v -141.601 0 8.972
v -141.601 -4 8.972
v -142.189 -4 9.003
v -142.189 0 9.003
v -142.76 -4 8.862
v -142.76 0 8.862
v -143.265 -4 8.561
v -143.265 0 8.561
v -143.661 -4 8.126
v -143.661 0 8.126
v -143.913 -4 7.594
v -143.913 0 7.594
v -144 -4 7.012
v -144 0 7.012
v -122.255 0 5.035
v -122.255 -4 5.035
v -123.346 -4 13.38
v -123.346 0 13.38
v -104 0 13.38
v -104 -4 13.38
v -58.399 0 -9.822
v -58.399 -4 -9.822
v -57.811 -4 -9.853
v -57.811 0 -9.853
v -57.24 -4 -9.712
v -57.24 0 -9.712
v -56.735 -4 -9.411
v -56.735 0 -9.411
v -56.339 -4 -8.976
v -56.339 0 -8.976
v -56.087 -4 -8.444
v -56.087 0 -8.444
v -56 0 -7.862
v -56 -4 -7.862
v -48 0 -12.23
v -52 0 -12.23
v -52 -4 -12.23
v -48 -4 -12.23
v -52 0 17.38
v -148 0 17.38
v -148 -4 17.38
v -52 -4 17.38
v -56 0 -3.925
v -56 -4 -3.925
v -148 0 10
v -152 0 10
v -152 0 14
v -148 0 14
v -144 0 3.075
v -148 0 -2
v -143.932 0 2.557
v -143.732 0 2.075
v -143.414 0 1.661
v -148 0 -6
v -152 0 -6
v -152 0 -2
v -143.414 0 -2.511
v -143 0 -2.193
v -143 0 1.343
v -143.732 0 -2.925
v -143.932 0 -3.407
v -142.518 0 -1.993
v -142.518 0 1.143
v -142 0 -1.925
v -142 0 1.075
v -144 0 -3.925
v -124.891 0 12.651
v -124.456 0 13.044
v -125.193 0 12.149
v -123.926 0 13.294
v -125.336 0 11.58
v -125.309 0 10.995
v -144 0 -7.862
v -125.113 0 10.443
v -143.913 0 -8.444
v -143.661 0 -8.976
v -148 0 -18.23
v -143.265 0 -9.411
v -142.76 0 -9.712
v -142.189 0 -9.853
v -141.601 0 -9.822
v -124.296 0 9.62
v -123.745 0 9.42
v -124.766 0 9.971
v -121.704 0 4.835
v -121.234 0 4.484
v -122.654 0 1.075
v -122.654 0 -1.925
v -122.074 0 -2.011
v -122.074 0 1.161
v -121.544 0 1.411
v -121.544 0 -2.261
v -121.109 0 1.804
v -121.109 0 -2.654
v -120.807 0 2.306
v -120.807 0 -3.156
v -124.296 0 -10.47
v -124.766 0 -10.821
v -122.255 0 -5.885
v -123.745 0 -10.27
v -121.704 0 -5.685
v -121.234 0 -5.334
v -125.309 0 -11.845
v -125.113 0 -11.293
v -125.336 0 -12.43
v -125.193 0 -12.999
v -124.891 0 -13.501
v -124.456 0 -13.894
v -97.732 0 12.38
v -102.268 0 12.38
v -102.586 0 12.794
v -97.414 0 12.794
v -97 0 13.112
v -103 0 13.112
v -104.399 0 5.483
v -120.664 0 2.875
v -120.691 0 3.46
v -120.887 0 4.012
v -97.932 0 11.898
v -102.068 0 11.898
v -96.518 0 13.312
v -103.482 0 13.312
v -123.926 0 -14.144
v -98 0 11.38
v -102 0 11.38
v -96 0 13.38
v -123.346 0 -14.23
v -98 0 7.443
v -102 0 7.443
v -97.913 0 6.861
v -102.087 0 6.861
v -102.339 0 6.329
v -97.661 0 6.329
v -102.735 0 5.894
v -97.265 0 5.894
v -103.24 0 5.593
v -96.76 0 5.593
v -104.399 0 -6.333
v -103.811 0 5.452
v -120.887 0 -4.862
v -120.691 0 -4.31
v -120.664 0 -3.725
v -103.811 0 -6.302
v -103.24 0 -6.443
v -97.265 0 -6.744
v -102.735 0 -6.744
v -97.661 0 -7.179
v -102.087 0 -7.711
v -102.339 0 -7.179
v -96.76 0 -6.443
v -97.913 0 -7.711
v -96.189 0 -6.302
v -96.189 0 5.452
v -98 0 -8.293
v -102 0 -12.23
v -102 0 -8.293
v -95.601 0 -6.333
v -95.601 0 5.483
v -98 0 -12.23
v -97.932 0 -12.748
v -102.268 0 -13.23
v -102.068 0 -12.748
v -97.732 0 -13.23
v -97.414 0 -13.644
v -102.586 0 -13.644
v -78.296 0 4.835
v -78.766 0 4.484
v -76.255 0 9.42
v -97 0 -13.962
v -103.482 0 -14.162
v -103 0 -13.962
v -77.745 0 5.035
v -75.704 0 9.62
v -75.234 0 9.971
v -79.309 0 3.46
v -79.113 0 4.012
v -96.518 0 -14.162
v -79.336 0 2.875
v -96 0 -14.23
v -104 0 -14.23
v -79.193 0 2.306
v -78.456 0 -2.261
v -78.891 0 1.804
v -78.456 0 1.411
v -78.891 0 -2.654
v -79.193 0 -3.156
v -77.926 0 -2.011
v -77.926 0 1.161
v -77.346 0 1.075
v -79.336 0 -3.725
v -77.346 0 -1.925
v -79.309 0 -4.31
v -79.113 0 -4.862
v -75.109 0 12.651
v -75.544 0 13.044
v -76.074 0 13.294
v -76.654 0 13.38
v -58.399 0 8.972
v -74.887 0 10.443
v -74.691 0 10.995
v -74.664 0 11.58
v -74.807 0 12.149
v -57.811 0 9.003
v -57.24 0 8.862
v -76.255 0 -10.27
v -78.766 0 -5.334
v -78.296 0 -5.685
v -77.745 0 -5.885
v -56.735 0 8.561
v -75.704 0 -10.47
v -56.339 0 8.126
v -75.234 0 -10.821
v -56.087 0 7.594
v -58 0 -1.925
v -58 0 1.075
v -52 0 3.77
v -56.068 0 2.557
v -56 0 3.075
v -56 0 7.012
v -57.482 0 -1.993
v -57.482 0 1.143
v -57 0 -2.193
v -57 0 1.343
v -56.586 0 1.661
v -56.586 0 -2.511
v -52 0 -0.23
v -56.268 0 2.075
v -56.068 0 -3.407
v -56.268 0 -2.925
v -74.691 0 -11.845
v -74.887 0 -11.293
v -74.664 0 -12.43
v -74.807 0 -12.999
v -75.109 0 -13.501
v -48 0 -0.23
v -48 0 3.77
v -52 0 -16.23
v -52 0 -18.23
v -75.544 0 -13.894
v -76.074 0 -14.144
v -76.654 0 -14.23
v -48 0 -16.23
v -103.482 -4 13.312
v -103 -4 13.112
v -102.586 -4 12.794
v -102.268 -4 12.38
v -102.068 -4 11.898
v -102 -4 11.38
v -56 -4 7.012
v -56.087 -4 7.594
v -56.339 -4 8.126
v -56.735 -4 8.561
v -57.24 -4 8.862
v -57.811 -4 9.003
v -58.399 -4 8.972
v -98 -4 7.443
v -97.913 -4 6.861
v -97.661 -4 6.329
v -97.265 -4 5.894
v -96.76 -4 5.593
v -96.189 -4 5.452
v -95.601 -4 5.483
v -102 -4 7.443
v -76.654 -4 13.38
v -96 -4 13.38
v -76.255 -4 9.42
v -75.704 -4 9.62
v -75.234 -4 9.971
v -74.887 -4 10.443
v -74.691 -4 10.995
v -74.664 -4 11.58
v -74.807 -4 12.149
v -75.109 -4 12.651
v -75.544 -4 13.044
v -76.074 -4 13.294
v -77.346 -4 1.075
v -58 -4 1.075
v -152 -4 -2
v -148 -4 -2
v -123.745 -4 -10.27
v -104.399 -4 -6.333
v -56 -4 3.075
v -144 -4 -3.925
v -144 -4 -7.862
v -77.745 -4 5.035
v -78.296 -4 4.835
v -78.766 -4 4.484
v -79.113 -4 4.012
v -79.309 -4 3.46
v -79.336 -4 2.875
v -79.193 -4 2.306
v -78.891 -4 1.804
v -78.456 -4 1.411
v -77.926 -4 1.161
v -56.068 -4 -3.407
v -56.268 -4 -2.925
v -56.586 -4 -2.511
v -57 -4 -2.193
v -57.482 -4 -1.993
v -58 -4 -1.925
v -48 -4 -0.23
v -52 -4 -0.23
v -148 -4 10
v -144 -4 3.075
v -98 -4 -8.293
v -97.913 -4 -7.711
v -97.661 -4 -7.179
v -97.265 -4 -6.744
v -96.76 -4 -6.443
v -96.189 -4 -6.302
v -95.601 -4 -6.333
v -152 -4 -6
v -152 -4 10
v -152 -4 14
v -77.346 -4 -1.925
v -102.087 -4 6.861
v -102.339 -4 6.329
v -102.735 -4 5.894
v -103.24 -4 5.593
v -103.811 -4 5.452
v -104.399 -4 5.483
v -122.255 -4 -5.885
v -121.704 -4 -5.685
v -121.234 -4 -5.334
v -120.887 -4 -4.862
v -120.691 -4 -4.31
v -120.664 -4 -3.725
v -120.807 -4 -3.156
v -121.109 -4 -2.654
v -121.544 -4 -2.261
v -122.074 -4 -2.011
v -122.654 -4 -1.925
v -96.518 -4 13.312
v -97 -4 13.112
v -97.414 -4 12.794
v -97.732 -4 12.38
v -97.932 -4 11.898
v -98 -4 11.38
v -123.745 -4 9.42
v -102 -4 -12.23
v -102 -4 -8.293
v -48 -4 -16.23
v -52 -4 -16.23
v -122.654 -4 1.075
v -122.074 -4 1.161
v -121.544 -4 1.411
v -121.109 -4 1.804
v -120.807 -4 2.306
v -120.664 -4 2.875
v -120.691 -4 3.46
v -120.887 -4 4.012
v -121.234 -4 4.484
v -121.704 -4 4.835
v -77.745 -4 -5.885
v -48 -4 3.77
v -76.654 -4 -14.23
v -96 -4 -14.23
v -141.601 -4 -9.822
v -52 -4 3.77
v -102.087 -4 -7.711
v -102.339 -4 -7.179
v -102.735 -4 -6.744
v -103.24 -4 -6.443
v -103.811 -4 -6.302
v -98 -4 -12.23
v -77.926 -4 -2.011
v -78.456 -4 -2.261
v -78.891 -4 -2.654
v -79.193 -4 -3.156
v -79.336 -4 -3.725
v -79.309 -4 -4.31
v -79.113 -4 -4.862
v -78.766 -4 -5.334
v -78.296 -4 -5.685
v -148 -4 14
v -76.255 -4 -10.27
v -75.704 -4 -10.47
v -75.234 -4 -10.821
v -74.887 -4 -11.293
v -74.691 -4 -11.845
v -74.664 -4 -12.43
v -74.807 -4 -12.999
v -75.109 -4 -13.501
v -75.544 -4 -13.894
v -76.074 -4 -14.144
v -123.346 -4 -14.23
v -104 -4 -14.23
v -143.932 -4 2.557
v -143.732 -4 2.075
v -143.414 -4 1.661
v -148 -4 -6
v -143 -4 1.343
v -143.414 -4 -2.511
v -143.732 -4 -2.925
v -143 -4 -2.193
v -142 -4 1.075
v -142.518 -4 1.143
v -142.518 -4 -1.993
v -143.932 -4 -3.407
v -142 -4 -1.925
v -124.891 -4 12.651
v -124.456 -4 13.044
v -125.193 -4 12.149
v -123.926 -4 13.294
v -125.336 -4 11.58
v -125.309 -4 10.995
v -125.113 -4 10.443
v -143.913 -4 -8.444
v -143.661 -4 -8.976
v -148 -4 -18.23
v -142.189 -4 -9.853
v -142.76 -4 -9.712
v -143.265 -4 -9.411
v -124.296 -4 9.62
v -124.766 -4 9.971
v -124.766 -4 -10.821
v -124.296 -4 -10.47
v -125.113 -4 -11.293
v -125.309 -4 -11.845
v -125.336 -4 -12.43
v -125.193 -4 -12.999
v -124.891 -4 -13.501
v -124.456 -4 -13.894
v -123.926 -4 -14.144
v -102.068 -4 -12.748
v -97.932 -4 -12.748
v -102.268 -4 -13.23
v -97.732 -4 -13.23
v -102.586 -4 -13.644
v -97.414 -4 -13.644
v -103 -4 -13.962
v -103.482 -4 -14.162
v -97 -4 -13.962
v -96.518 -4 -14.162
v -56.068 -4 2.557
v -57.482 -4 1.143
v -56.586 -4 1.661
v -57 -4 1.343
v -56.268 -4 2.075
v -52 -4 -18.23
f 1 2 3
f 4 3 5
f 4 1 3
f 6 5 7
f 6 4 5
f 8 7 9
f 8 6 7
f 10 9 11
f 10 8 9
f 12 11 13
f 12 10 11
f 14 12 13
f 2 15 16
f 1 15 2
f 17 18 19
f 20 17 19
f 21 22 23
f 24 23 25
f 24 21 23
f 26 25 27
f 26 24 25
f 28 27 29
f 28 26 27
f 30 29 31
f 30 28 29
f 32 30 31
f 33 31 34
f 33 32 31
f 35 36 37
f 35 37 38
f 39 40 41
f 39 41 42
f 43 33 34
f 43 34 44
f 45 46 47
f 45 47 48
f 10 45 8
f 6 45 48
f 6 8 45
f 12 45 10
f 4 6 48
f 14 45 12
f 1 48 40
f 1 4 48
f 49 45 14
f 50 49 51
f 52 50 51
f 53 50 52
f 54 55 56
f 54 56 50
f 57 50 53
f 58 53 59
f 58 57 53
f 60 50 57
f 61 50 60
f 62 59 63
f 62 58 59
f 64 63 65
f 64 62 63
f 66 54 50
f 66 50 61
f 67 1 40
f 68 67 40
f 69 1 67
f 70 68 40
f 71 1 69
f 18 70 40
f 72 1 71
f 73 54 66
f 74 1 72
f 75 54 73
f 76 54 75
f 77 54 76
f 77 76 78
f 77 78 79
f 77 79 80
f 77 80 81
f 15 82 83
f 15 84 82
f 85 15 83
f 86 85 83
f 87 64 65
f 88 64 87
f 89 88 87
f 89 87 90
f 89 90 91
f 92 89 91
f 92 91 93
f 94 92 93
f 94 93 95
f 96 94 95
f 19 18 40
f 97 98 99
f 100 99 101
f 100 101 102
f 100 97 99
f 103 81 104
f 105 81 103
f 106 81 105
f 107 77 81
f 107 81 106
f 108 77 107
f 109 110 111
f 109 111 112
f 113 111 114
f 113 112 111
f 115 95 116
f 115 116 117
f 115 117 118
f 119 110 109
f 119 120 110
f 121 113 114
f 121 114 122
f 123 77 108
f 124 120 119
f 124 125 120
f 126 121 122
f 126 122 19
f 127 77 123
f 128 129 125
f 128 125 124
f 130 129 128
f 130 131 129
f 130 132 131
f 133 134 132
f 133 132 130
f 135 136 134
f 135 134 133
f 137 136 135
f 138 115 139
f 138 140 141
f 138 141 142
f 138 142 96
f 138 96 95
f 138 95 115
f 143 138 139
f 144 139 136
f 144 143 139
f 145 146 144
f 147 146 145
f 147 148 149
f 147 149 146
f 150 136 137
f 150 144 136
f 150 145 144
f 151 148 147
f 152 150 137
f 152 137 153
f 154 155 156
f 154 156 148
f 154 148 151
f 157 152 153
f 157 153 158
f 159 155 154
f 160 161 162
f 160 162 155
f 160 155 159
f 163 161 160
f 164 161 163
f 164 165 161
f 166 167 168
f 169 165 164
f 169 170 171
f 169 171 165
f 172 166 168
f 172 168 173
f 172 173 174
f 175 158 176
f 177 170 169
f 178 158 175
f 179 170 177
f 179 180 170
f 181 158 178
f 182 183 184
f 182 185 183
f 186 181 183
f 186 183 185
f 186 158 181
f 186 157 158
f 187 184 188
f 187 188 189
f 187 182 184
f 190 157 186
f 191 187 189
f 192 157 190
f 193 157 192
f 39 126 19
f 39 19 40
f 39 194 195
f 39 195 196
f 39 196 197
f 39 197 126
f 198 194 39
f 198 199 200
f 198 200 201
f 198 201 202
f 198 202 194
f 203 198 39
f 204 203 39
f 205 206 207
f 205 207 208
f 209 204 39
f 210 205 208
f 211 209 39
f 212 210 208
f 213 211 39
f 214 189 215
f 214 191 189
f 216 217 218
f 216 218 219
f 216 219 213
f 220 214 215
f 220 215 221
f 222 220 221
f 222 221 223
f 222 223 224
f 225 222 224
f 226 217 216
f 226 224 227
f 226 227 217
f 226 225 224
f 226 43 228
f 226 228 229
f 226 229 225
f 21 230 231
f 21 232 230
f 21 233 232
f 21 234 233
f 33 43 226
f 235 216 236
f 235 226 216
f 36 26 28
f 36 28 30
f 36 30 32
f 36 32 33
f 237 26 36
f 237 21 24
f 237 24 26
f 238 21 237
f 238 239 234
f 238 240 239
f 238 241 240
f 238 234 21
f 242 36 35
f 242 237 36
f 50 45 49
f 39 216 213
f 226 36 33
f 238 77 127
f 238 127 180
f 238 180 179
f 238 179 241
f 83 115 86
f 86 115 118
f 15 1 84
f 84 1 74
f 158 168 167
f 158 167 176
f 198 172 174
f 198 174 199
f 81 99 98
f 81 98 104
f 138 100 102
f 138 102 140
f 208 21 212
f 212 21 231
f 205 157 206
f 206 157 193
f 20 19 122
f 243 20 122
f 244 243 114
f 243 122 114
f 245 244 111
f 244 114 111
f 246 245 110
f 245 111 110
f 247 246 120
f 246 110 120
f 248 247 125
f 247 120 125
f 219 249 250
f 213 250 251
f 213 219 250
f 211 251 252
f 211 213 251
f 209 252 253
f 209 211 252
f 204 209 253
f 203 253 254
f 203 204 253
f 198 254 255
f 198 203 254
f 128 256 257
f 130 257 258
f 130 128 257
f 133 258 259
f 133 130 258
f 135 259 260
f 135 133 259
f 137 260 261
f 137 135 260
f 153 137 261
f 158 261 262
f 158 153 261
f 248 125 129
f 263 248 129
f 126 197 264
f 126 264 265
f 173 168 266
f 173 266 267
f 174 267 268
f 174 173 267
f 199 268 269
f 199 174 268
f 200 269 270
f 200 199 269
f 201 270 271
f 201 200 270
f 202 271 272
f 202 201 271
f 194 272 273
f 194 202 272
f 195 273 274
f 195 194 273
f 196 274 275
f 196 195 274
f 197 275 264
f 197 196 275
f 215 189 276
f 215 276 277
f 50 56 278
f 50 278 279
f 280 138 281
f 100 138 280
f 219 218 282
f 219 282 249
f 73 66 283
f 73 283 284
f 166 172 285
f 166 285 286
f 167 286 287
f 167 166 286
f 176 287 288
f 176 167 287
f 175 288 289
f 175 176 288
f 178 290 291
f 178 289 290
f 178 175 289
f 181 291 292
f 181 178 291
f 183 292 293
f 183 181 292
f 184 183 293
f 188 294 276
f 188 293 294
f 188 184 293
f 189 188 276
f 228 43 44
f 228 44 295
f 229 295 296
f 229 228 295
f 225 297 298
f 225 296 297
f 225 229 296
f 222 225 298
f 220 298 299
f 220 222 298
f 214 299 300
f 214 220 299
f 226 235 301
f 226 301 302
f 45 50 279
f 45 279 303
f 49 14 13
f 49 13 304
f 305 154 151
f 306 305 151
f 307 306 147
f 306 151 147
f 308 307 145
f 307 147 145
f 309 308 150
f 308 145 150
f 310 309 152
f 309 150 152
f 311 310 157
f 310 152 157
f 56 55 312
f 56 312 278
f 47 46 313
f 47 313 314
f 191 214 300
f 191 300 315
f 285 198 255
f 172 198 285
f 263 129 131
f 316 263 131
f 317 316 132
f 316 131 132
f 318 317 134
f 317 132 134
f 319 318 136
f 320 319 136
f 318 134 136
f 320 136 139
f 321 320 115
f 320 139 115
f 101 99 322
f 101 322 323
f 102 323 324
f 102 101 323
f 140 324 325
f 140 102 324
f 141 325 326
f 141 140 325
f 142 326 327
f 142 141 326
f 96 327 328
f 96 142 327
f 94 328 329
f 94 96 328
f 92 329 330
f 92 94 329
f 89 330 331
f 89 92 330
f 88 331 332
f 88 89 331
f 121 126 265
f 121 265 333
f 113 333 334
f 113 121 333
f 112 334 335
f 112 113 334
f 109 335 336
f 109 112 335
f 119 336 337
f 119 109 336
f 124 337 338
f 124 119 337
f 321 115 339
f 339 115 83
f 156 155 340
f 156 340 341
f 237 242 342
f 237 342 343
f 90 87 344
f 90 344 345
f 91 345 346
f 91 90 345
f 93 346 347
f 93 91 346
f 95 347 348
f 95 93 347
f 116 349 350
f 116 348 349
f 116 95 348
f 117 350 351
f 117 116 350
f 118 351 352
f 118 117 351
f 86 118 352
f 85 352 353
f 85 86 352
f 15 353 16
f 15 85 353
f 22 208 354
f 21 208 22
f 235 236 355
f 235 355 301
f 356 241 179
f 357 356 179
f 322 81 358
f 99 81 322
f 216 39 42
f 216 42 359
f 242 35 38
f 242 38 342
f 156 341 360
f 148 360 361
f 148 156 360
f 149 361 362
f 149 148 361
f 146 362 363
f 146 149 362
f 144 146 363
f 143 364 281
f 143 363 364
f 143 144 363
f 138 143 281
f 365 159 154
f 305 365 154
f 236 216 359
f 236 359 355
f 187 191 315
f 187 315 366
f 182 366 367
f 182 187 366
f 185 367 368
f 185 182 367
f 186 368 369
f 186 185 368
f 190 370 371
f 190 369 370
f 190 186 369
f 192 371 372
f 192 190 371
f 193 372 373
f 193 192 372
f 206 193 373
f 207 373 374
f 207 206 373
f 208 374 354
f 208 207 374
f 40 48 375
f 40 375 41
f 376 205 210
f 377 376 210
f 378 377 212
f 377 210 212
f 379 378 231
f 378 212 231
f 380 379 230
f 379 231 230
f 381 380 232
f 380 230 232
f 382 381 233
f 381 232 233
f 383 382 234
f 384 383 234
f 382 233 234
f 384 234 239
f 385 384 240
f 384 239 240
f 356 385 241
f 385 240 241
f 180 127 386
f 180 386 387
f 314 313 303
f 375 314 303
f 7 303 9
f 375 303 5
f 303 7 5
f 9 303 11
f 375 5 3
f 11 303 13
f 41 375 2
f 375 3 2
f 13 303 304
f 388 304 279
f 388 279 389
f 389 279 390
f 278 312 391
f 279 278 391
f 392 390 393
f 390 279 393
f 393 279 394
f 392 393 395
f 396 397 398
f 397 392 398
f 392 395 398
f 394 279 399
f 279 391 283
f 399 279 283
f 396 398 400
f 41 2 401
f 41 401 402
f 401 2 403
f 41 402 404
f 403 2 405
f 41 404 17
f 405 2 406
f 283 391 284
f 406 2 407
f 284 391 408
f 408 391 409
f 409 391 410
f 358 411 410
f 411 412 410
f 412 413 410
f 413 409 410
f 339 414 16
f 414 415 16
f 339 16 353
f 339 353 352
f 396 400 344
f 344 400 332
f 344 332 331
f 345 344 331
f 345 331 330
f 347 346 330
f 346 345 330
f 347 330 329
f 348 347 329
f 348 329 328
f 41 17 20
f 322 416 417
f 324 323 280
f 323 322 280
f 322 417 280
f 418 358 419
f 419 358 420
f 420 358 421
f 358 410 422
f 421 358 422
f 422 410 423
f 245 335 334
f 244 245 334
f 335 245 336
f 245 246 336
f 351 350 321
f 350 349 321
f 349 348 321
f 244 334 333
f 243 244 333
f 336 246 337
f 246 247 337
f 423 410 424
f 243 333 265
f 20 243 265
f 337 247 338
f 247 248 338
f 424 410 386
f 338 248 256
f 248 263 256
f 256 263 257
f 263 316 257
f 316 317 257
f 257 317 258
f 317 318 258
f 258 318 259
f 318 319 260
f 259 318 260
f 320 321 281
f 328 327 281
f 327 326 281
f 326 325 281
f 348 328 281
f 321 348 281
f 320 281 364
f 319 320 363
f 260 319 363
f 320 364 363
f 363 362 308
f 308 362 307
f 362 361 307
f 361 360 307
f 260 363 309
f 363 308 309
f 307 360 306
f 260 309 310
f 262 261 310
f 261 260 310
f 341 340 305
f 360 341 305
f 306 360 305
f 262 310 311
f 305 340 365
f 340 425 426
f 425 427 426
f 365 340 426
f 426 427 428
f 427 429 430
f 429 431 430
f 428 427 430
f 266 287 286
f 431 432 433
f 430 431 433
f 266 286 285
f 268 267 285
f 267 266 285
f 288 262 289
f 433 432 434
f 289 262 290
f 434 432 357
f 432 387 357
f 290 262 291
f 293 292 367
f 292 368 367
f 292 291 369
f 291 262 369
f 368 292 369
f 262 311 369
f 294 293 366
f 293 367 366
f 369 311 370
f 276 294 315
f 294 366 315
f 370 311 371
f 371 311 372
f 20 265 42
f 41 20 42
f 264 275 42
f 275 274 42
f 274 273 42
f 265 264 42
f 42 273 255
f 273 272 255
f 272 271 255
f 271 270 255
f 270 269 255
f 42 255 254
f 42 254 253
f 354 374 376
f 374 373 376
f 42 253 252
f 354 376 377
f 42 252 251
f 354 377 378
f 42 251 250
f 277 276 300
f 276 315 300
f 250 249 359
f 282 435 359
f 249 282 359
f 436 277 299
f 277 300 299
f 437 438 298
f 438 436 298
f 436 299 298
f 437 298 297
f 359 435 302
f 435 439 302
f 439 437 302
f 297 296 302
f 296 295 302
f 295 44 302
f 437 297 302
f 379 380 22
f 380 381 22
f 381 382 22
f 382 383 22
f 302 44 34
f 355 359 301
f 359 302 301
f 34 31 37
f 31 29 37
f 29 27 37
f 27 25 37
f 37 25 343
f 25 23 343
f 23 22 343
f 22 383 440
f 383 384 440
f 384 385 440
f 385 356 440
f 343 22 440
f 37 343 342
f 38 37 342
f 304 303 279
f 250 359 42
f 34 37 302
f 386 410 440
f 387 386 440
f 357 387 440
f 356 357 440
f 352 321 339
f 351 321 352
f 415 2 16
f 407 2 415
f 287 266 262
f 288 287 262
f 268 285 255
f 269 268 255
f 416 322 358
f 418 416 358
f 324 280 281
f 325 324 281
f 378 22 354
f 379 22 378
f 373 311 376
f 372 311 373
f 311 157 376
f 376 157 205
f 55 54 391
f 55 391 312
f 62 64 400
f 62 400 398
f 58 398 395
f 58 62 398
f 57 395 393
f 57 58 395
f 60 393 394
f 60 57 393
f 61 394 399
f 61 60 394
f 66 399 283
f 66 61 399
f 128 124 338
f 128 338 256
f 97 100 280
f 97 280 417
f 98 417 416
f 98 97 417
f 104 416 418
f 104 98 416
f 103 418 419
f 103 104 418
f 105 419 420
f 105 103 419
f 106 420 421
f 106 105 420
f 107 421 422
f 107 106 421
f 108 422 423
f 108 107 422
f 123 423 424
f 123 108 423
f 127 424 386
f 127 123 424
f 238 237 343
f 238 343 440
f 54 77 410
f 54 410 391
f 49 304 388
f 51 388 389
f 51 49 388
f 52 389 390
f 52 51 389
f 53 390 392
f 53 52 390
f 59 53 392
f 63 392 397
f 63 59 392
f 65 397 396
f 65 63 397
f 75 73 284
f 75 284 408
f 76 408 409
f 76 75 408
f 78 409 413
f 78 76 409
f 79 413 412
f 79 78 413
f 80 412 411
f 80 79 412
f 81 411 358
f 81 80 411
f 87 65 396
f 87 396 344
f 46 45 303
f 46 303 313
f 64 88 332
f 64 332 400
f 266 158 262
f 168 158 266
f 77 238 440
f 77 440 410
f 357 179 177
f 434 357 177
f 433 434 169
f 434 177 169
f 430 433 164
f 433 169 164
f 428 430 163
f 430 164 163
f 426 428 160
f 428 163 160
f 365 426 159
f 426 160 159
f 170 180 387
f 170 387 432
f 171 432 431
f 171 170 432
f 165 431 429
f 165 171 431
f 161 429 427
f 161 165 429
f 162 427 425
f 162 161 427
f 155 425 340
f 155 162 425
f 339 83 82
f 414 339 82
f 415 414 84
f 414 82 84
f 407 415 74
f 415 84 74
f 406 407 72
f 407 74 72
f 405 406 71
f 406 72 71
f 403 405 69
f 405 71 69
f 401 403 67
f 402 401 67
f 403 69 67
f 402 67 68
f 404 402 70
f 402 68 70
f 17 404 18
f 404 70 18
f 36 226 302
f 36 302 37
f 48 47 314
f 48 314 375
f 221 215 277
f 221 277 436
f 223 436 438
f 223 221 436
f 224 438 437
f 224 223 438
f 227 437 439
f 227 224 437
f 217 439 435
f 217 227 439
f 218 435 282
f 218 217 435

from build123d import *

# Parameters (mm, degrees)
BOSS_EXTRUDE1_DEPTH = 4
CUT_EXTRUDE1_DEPTH  = 10


with BuildPart() as part:
    # Sketch1 → Boss-Extrude1 (new body)
    with BuildSketch(Plane(origin=(0, 0, 0), x_dir=(1, 0, 0), z_dir=(0, 1, 0))):
        Polygon((-148, 18.23), (-148, 6), (-152, 6), (-152, 2), (-148, 2), (-148, -10), (-152, -10), (-152, -14), (-148, -14), (-148, -17.38), (-52, -17.38), (-52, -3.77), (-48, -3.77), (-48, 0.23), (-52, 0.23), (-52, 12.23), (-48, 12.23), (-48, 16.23), (-52, 16.23), (-52, 18.23), align=None)
    extrude(amount=-BOSS_EXTRUDE1_DEPTH)

    # Sketch2 → Cut-Extrude1 (cut)
    with BuildSketch(Plane(origin=(0, 0, 0), x_dir=(1, 0, 0), z_dir=(0, 1, 0))):
        with BuildLine():
            ThreePointArc((-144, 7.862318396), (-143.26536282, 9.411142768), (-141.601143065, 9.822143171))
            Line((-141.601143065, 9.822143171), (-122.254722174, 5.884824774))
            ThreePointArc((-122.254722174, 5.884824774), (-120.663648262, 3.724562414), (-122.653579109, 1.925))
            Line((-122.653579109, 1.925), (-142, 1.925))
            ThreePointArc((-142, 1.925), (-143.414213562, 2.510786438), (-144, 3.925))
            Line((-144, 3.925), (-144, 7.862318396))
        make_face()
        with BuildLine():
            Line((-123.346420891, 14.23), (-104, 14.23))
            ThreePointArc((-104, 14.23), (-102.585786438, 13.644213562), (-102, 12.23))
            Line((-102, 12.23), (-102, 8.292681604))
            ThreePointArc((-102, 8.292681604), (-102.73463718, 6.743857232), (-104.398856935, 6.332856829))
            Line((-104.398856935, 6.332856829), (-123.745277826, 10.270175226))
            ThreePointArc((-123.745277826, 10.270175226), (-125.336351738, 12.430437586), (-123.346420891, 14.23))
        make_face()
        with BuildLine():
            Line((-98, 12.23), (-98, 8.292681604))
            ThreePointArc((-98, 8.292681604), (-97.26536282, 6.743857232), (-95.601143065, 6.332856829))
            Line((-95.601143065, 6.332856829), (-76.254722174, 10.270175226))
            ThreePointArc((-76.254722174, 10.270175226), (-74.663648262, 12.430437586), (-76.653579109, 14.23))
            Line((-76.653579109, 14.23), (-96, 14.23))
            ThreePointArc((-96, 14.23), (-97.414213562, 13.644213562), (-98, 12.23))
        make_face()
        with BuildLine():
            ThreePointArc((-56, 3.925), (-56.585786438, 2.510786438), (-58, 1.925))
            Line((-58, 1.925), (-77.346420891, 1.925))
            ThreePointArc((-77.346420891, 1.925), (-79.336351738, 3.724562414), (-77.745277826, 5.884824774))
            Line((-77.745277826, 5.884824774), (-58.398856935, 9.822143171))
            ThreePointArc((-58.398856935, 9.822143171), (-56.73463718, 9.411142768), (-56, 7.862318396))
            Line((-56, 7.862318396), (-56, 3.925))
        make_face()
        with BuildLine():
            ThreePointArc((-56, -7.012318396), (-56.73463718, -8.561142768), (-58.398856935, -8.972143171))
            Line((-58.398856935, -8.972143171), (-77.745277826, -5.034824774))
            ThreePointArc((-77.745277826, -5.034824774), (-79.336351738, -2.874562414), (-77.346420891, -1.075))
            Line((-77.346420891, -1.075), (-58, -1.075))
            ThreePointArc((-58, -1.075), (-56.585786438, -1.660786438), (-56, -3.075))
            Line((-56, -3.075), (-56, -7.012318396))
        make_face()
        with BuildLine():
            Line((-76.653579109, -13.38), (-96, -13.38))
            ThreePointArc((-96, -13.38), (-97.414213562, -12.794213562), (-98, -11.38))
            Line((-98, -11.38), (-98, -7.442681604))
            ThreePointArc((-98, -7.442681604), (-97.26536282, -5.893857232), (-95.601143065, -5.482856829))
            Line((-95.601143065, -5.482856829), (-76.254722174, -9.420175226))
            ThreePointArc((-76.254722174, -9.420175226), (-74.663648262, -11.580437586), (-76.653579109, -13.38))
        make_face()
        with BuildLine():
            ThreePointArc((-144, -3.075), (-143.414213562, -1.660786438), (-142, -1.075))
            Line((-142, -1.075), (-122.653579109, -1.075))
            ThreePointArc((-122.653579109, -1.075), (-120.663648262, -2.874562414), (-122.254722174, -5.034824774))
            Line((-122.254722174, -5.034824774), (-141.601143065, -8.972143171))
            ThreePointArc((-141.601143065, -8.972143171), (-143.26536282, -8.561142768), (-144, -7.012318396))
            Line((-144, -7.012318396), (-144, -3.075))
        make_face()
        with BuildLine():
            Line((-104.398856935, -5.482856829), (-123.745277826, -9.420175226))
            ThreePointArc((-123.745277826, -9.420175226), (-125.336351738, -11.580437586), (-123.346420891, -13.38))
            Line((-123.346420891, -13.38), (-104, -13.38))
            ThreePointArc((-104, -13.38), (-102.585786438, -12.794213562), (-102, -11.38))
            Line((-102, -11.38), (-102, -7.442681604))
            ThreePointArc((-102, -7.442681604), (-102.73463718, -5.893857232), (-104.398856935, -5.482856829))
        make_face()
    extrude(amount=-CUT_EXTRUDE1_DEPTH, mode=Mode.SUBTRACT)


solid = part.part
